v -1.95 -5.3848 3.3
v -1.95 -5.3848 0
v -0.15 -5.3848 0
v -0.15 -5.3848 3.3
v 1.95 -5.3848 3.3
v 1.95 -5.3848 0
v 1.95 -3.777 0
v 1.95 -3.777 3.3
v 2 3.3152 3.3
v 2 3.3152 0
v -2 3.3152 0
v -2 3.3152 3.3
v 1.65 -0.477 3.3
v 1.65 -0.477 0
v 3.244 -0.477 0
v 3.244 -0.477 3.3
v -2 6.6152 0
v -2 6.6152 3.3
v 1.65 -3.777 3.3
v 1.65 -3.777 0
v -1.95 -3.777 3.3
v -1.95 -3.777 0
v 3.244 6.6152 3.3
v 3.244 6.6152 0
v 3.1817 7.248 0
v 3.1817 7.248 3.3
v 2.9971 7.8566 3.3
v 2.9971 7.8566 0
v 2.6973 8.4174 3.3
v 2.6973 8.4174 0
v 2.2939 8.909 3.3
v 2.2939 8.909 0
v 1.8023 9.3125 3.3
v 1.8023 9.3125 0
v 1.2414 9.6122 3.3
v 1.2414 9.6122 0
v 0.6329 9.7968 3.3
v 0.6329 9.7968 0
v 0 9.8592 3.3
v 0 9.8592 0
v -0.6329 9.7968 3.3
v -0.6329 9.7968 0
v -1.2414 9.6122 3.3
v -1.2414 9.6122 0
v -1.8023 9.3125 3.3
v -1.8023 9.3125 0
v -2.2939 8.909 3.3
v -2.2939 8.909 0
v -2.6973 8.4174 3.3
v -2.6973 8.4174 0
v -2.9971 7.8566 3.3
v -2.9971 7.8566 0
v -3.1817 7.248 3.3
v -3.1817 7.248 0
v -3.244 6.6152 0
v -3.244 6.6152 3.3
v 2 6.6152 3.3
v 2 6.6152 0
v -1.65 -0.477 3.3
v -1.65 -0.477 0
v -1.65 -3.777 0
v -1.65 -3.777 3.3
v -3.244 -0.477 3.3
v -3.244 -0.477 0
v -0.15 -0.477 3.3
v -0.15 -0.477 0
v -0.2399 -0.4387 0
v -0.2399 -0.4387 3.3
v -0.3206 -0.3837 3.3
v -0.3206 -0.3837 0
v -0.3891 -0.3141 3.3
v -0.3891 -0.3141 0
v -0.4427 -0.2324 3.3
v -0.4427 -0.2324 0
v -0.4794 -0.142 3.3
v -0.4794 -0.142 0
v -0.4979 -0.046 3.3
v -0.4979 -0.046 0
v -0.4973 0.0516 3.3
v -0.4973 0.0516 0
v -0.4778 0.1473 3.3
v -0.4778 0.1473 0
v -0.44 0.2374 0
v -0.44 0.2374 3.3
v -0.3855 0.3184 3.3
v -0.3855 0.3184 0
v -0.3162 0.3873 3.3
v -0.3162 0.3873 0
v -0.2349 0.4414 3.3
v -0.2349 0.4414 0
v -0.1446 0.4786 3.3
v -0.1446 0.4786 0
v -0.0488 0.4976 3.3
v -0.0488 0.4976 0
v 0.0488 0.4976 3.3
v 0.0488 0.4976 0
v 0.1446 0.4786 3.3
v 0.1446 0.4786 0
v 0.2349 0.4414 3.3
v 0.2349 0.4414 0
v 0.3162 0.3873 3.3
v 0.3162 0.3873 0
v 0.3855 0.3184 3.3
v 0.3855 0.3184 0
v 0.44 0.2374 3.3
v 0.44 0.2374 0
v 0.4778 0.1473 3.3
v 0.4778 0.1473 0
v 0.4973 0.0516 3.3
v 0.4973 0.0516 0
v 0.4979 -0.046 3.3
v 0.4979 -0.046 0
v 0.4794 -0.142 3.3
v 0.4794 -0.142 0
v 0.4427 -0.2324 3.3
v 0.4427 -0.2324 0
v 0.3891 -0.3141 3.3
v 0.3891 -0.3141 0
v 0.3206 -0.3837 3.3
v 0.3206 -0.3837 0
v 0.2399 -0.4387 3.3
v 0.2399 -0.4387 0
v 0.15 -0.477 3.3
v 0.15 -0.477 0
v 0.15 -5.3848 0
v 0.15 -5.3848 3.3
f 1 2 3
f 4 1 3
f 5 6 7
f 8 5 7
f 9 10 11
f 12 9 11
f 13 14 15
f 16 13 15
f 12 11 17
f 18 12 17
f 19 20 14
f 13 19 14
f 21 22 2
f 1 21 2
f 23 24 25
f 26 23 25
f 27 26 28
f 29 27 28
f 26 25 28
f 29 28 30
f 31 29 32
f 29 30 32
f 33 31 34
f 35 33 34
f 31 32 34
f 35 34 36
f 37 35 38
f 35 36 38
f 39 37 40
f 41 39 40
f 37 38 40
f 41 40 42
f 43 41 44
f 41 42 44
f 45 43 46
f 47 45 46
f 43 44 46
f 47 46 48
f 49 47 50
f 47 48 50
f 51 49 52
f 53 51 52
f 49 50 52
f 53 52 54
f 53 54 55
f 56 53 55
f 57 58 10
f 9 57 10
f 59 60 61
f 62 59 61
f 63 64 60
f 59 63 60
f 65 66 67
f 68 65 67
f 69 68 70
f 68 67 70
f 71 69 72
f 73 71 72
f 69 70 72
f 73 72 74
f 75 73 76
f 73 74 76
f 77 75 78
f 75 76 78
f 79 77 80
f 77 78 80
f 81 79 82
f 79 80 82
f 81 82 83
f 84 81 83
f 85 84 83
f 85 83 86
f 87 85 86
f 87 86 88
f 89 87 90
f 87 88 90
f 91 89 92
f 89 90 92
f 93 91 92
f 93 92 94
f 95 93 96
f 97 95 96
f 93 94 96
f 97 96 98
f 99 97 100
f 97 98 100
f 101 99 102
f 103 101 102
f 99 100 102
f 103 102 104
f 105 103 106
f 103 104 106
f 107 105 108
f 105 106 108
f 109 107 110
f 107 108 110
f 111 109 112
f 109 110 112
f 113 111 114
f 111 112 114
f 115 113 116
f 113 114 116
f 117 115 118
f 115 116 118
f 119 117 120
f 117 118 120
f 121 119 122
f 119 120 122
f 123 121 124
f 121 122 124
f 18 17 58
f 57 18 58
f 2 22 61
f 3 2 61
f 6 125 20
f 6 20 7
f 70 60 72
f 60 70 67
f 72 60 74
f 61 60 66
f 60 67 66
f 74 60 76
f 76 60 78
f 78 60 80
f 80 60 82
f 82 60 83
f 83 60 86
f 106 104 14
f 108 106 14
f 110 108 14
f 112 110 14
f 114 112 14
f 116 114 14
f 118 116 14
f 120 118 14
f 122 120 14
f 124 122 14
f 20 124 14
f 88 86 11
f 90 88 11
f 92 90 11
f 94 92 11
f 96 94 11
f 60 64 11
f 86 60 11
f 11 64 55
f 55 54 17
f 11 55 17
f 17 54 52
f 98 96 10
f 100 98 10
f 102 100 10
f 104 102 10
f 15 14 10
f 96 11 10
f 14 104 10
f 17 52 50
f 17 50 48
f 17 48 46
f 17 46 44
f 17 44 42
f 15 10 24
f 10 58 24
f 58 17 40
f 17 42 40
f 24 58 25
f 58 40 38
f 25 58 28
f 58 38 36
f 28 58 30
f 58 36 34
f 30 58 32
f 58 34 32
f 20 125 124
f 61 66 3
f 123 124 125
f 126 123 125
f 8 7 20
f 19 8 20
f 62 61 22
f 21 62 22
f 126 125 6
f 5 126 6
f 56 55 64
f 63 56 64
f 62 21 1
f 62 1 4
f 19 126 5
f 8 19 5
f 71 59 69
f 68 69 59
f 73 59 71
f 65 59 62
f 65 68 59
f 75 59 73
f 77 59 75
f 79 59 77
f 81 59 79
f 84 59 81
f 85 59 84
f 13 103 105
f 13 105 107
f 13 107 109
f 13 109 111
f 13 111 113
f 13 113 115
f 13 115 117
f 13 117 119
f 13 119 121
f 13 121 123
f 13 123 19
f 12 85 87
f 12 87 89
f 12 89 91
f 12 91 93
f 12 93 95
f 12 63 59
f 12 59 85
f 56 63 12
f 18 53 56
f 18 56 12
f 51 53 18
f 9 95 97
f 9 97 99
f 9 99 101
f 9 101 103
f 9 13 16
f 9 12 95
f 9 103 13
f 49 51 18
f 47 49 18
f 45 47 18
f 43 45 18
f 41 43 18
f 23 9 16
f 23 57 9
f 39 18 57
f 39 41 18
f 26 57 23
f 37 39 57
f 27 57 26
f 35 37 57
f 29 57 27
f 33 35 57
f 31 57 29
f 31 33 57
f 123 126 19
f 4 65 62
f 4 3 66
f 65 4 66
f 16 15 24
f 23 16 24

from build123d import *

# Parameters (mm, degrees)
SALIENTE_EXTRUIR2_DEPTH = 3.3


with BuildPart() as part:
    # Croquis2 → Saliente-Extruir2 (new body)
    with BuildSketch(Plane.XY):
        with BuildLine():
            Line((-0.15, -3.776969601), (-0.15, -0.476969601))
            ThreePointArc((-0.15, -0.476969601), (0, 0.5), (0.15, -0.476969601))
            Line((0.15, -0.476969601), (0.15, -3.776969601))
            Line((0.15, -3.776969601), (0.15, -5.384848335))
            Line((0.15, -5.384848335), (1.95, -5.384848335))
            Line((1.95, -5.384848335), (1.95, -3.776969601))
            Line((1.95, -3.776969601), (1.65, -3.776969601))
            Line((1.65, -3.776969601), (1.65, -0.476969601))
            Line((1.65, -0.476969601), (3.24401575, -0.476969601))
            Line((3.24401575, -0.476969601), (3.24401575, 1.350254565))
            Line((3.24401575, 1.350254565), (3.24401575, 6.615151665))
            ThreePointArc((3.24401575, 6.615151665), (0, 9.859167415), (-3.24401575, 6.615151665))
            Line((-3.24401575, 6.615151665), (-3.24401575, 1.350254565))
            Line((-3.24401575, 1.350254565), (-3.24401575, -0.476969601))
            Line((-3.24401575, -0.476969601), (-1.65, -0.476969601))
            Line((-1.65, -0.476969601), (-1.65, -3.776969601))
            Line((-1.65, -3.776969601), (-1.95, -3.776969601))
            Line((-1.95, -3.776969601), (-1.95, -5.384848335))
            Line((-1.95, -5.384848335), (-0.15, -5.384848335))
            Line((-0.15, -5.384848335), (-0.15, -3.776969601))
        make_face()
        Polygon((-2, 6.615151665), (0, 6.615151665), (2, 6.615151665), (2, 3.315151665), (-2, 3.315151665), align=None, mode=Mode.SUBTRACT)
    extrude(amount=SALIENTE_EXTRUIR2_DEPTH)


solid = part.part
